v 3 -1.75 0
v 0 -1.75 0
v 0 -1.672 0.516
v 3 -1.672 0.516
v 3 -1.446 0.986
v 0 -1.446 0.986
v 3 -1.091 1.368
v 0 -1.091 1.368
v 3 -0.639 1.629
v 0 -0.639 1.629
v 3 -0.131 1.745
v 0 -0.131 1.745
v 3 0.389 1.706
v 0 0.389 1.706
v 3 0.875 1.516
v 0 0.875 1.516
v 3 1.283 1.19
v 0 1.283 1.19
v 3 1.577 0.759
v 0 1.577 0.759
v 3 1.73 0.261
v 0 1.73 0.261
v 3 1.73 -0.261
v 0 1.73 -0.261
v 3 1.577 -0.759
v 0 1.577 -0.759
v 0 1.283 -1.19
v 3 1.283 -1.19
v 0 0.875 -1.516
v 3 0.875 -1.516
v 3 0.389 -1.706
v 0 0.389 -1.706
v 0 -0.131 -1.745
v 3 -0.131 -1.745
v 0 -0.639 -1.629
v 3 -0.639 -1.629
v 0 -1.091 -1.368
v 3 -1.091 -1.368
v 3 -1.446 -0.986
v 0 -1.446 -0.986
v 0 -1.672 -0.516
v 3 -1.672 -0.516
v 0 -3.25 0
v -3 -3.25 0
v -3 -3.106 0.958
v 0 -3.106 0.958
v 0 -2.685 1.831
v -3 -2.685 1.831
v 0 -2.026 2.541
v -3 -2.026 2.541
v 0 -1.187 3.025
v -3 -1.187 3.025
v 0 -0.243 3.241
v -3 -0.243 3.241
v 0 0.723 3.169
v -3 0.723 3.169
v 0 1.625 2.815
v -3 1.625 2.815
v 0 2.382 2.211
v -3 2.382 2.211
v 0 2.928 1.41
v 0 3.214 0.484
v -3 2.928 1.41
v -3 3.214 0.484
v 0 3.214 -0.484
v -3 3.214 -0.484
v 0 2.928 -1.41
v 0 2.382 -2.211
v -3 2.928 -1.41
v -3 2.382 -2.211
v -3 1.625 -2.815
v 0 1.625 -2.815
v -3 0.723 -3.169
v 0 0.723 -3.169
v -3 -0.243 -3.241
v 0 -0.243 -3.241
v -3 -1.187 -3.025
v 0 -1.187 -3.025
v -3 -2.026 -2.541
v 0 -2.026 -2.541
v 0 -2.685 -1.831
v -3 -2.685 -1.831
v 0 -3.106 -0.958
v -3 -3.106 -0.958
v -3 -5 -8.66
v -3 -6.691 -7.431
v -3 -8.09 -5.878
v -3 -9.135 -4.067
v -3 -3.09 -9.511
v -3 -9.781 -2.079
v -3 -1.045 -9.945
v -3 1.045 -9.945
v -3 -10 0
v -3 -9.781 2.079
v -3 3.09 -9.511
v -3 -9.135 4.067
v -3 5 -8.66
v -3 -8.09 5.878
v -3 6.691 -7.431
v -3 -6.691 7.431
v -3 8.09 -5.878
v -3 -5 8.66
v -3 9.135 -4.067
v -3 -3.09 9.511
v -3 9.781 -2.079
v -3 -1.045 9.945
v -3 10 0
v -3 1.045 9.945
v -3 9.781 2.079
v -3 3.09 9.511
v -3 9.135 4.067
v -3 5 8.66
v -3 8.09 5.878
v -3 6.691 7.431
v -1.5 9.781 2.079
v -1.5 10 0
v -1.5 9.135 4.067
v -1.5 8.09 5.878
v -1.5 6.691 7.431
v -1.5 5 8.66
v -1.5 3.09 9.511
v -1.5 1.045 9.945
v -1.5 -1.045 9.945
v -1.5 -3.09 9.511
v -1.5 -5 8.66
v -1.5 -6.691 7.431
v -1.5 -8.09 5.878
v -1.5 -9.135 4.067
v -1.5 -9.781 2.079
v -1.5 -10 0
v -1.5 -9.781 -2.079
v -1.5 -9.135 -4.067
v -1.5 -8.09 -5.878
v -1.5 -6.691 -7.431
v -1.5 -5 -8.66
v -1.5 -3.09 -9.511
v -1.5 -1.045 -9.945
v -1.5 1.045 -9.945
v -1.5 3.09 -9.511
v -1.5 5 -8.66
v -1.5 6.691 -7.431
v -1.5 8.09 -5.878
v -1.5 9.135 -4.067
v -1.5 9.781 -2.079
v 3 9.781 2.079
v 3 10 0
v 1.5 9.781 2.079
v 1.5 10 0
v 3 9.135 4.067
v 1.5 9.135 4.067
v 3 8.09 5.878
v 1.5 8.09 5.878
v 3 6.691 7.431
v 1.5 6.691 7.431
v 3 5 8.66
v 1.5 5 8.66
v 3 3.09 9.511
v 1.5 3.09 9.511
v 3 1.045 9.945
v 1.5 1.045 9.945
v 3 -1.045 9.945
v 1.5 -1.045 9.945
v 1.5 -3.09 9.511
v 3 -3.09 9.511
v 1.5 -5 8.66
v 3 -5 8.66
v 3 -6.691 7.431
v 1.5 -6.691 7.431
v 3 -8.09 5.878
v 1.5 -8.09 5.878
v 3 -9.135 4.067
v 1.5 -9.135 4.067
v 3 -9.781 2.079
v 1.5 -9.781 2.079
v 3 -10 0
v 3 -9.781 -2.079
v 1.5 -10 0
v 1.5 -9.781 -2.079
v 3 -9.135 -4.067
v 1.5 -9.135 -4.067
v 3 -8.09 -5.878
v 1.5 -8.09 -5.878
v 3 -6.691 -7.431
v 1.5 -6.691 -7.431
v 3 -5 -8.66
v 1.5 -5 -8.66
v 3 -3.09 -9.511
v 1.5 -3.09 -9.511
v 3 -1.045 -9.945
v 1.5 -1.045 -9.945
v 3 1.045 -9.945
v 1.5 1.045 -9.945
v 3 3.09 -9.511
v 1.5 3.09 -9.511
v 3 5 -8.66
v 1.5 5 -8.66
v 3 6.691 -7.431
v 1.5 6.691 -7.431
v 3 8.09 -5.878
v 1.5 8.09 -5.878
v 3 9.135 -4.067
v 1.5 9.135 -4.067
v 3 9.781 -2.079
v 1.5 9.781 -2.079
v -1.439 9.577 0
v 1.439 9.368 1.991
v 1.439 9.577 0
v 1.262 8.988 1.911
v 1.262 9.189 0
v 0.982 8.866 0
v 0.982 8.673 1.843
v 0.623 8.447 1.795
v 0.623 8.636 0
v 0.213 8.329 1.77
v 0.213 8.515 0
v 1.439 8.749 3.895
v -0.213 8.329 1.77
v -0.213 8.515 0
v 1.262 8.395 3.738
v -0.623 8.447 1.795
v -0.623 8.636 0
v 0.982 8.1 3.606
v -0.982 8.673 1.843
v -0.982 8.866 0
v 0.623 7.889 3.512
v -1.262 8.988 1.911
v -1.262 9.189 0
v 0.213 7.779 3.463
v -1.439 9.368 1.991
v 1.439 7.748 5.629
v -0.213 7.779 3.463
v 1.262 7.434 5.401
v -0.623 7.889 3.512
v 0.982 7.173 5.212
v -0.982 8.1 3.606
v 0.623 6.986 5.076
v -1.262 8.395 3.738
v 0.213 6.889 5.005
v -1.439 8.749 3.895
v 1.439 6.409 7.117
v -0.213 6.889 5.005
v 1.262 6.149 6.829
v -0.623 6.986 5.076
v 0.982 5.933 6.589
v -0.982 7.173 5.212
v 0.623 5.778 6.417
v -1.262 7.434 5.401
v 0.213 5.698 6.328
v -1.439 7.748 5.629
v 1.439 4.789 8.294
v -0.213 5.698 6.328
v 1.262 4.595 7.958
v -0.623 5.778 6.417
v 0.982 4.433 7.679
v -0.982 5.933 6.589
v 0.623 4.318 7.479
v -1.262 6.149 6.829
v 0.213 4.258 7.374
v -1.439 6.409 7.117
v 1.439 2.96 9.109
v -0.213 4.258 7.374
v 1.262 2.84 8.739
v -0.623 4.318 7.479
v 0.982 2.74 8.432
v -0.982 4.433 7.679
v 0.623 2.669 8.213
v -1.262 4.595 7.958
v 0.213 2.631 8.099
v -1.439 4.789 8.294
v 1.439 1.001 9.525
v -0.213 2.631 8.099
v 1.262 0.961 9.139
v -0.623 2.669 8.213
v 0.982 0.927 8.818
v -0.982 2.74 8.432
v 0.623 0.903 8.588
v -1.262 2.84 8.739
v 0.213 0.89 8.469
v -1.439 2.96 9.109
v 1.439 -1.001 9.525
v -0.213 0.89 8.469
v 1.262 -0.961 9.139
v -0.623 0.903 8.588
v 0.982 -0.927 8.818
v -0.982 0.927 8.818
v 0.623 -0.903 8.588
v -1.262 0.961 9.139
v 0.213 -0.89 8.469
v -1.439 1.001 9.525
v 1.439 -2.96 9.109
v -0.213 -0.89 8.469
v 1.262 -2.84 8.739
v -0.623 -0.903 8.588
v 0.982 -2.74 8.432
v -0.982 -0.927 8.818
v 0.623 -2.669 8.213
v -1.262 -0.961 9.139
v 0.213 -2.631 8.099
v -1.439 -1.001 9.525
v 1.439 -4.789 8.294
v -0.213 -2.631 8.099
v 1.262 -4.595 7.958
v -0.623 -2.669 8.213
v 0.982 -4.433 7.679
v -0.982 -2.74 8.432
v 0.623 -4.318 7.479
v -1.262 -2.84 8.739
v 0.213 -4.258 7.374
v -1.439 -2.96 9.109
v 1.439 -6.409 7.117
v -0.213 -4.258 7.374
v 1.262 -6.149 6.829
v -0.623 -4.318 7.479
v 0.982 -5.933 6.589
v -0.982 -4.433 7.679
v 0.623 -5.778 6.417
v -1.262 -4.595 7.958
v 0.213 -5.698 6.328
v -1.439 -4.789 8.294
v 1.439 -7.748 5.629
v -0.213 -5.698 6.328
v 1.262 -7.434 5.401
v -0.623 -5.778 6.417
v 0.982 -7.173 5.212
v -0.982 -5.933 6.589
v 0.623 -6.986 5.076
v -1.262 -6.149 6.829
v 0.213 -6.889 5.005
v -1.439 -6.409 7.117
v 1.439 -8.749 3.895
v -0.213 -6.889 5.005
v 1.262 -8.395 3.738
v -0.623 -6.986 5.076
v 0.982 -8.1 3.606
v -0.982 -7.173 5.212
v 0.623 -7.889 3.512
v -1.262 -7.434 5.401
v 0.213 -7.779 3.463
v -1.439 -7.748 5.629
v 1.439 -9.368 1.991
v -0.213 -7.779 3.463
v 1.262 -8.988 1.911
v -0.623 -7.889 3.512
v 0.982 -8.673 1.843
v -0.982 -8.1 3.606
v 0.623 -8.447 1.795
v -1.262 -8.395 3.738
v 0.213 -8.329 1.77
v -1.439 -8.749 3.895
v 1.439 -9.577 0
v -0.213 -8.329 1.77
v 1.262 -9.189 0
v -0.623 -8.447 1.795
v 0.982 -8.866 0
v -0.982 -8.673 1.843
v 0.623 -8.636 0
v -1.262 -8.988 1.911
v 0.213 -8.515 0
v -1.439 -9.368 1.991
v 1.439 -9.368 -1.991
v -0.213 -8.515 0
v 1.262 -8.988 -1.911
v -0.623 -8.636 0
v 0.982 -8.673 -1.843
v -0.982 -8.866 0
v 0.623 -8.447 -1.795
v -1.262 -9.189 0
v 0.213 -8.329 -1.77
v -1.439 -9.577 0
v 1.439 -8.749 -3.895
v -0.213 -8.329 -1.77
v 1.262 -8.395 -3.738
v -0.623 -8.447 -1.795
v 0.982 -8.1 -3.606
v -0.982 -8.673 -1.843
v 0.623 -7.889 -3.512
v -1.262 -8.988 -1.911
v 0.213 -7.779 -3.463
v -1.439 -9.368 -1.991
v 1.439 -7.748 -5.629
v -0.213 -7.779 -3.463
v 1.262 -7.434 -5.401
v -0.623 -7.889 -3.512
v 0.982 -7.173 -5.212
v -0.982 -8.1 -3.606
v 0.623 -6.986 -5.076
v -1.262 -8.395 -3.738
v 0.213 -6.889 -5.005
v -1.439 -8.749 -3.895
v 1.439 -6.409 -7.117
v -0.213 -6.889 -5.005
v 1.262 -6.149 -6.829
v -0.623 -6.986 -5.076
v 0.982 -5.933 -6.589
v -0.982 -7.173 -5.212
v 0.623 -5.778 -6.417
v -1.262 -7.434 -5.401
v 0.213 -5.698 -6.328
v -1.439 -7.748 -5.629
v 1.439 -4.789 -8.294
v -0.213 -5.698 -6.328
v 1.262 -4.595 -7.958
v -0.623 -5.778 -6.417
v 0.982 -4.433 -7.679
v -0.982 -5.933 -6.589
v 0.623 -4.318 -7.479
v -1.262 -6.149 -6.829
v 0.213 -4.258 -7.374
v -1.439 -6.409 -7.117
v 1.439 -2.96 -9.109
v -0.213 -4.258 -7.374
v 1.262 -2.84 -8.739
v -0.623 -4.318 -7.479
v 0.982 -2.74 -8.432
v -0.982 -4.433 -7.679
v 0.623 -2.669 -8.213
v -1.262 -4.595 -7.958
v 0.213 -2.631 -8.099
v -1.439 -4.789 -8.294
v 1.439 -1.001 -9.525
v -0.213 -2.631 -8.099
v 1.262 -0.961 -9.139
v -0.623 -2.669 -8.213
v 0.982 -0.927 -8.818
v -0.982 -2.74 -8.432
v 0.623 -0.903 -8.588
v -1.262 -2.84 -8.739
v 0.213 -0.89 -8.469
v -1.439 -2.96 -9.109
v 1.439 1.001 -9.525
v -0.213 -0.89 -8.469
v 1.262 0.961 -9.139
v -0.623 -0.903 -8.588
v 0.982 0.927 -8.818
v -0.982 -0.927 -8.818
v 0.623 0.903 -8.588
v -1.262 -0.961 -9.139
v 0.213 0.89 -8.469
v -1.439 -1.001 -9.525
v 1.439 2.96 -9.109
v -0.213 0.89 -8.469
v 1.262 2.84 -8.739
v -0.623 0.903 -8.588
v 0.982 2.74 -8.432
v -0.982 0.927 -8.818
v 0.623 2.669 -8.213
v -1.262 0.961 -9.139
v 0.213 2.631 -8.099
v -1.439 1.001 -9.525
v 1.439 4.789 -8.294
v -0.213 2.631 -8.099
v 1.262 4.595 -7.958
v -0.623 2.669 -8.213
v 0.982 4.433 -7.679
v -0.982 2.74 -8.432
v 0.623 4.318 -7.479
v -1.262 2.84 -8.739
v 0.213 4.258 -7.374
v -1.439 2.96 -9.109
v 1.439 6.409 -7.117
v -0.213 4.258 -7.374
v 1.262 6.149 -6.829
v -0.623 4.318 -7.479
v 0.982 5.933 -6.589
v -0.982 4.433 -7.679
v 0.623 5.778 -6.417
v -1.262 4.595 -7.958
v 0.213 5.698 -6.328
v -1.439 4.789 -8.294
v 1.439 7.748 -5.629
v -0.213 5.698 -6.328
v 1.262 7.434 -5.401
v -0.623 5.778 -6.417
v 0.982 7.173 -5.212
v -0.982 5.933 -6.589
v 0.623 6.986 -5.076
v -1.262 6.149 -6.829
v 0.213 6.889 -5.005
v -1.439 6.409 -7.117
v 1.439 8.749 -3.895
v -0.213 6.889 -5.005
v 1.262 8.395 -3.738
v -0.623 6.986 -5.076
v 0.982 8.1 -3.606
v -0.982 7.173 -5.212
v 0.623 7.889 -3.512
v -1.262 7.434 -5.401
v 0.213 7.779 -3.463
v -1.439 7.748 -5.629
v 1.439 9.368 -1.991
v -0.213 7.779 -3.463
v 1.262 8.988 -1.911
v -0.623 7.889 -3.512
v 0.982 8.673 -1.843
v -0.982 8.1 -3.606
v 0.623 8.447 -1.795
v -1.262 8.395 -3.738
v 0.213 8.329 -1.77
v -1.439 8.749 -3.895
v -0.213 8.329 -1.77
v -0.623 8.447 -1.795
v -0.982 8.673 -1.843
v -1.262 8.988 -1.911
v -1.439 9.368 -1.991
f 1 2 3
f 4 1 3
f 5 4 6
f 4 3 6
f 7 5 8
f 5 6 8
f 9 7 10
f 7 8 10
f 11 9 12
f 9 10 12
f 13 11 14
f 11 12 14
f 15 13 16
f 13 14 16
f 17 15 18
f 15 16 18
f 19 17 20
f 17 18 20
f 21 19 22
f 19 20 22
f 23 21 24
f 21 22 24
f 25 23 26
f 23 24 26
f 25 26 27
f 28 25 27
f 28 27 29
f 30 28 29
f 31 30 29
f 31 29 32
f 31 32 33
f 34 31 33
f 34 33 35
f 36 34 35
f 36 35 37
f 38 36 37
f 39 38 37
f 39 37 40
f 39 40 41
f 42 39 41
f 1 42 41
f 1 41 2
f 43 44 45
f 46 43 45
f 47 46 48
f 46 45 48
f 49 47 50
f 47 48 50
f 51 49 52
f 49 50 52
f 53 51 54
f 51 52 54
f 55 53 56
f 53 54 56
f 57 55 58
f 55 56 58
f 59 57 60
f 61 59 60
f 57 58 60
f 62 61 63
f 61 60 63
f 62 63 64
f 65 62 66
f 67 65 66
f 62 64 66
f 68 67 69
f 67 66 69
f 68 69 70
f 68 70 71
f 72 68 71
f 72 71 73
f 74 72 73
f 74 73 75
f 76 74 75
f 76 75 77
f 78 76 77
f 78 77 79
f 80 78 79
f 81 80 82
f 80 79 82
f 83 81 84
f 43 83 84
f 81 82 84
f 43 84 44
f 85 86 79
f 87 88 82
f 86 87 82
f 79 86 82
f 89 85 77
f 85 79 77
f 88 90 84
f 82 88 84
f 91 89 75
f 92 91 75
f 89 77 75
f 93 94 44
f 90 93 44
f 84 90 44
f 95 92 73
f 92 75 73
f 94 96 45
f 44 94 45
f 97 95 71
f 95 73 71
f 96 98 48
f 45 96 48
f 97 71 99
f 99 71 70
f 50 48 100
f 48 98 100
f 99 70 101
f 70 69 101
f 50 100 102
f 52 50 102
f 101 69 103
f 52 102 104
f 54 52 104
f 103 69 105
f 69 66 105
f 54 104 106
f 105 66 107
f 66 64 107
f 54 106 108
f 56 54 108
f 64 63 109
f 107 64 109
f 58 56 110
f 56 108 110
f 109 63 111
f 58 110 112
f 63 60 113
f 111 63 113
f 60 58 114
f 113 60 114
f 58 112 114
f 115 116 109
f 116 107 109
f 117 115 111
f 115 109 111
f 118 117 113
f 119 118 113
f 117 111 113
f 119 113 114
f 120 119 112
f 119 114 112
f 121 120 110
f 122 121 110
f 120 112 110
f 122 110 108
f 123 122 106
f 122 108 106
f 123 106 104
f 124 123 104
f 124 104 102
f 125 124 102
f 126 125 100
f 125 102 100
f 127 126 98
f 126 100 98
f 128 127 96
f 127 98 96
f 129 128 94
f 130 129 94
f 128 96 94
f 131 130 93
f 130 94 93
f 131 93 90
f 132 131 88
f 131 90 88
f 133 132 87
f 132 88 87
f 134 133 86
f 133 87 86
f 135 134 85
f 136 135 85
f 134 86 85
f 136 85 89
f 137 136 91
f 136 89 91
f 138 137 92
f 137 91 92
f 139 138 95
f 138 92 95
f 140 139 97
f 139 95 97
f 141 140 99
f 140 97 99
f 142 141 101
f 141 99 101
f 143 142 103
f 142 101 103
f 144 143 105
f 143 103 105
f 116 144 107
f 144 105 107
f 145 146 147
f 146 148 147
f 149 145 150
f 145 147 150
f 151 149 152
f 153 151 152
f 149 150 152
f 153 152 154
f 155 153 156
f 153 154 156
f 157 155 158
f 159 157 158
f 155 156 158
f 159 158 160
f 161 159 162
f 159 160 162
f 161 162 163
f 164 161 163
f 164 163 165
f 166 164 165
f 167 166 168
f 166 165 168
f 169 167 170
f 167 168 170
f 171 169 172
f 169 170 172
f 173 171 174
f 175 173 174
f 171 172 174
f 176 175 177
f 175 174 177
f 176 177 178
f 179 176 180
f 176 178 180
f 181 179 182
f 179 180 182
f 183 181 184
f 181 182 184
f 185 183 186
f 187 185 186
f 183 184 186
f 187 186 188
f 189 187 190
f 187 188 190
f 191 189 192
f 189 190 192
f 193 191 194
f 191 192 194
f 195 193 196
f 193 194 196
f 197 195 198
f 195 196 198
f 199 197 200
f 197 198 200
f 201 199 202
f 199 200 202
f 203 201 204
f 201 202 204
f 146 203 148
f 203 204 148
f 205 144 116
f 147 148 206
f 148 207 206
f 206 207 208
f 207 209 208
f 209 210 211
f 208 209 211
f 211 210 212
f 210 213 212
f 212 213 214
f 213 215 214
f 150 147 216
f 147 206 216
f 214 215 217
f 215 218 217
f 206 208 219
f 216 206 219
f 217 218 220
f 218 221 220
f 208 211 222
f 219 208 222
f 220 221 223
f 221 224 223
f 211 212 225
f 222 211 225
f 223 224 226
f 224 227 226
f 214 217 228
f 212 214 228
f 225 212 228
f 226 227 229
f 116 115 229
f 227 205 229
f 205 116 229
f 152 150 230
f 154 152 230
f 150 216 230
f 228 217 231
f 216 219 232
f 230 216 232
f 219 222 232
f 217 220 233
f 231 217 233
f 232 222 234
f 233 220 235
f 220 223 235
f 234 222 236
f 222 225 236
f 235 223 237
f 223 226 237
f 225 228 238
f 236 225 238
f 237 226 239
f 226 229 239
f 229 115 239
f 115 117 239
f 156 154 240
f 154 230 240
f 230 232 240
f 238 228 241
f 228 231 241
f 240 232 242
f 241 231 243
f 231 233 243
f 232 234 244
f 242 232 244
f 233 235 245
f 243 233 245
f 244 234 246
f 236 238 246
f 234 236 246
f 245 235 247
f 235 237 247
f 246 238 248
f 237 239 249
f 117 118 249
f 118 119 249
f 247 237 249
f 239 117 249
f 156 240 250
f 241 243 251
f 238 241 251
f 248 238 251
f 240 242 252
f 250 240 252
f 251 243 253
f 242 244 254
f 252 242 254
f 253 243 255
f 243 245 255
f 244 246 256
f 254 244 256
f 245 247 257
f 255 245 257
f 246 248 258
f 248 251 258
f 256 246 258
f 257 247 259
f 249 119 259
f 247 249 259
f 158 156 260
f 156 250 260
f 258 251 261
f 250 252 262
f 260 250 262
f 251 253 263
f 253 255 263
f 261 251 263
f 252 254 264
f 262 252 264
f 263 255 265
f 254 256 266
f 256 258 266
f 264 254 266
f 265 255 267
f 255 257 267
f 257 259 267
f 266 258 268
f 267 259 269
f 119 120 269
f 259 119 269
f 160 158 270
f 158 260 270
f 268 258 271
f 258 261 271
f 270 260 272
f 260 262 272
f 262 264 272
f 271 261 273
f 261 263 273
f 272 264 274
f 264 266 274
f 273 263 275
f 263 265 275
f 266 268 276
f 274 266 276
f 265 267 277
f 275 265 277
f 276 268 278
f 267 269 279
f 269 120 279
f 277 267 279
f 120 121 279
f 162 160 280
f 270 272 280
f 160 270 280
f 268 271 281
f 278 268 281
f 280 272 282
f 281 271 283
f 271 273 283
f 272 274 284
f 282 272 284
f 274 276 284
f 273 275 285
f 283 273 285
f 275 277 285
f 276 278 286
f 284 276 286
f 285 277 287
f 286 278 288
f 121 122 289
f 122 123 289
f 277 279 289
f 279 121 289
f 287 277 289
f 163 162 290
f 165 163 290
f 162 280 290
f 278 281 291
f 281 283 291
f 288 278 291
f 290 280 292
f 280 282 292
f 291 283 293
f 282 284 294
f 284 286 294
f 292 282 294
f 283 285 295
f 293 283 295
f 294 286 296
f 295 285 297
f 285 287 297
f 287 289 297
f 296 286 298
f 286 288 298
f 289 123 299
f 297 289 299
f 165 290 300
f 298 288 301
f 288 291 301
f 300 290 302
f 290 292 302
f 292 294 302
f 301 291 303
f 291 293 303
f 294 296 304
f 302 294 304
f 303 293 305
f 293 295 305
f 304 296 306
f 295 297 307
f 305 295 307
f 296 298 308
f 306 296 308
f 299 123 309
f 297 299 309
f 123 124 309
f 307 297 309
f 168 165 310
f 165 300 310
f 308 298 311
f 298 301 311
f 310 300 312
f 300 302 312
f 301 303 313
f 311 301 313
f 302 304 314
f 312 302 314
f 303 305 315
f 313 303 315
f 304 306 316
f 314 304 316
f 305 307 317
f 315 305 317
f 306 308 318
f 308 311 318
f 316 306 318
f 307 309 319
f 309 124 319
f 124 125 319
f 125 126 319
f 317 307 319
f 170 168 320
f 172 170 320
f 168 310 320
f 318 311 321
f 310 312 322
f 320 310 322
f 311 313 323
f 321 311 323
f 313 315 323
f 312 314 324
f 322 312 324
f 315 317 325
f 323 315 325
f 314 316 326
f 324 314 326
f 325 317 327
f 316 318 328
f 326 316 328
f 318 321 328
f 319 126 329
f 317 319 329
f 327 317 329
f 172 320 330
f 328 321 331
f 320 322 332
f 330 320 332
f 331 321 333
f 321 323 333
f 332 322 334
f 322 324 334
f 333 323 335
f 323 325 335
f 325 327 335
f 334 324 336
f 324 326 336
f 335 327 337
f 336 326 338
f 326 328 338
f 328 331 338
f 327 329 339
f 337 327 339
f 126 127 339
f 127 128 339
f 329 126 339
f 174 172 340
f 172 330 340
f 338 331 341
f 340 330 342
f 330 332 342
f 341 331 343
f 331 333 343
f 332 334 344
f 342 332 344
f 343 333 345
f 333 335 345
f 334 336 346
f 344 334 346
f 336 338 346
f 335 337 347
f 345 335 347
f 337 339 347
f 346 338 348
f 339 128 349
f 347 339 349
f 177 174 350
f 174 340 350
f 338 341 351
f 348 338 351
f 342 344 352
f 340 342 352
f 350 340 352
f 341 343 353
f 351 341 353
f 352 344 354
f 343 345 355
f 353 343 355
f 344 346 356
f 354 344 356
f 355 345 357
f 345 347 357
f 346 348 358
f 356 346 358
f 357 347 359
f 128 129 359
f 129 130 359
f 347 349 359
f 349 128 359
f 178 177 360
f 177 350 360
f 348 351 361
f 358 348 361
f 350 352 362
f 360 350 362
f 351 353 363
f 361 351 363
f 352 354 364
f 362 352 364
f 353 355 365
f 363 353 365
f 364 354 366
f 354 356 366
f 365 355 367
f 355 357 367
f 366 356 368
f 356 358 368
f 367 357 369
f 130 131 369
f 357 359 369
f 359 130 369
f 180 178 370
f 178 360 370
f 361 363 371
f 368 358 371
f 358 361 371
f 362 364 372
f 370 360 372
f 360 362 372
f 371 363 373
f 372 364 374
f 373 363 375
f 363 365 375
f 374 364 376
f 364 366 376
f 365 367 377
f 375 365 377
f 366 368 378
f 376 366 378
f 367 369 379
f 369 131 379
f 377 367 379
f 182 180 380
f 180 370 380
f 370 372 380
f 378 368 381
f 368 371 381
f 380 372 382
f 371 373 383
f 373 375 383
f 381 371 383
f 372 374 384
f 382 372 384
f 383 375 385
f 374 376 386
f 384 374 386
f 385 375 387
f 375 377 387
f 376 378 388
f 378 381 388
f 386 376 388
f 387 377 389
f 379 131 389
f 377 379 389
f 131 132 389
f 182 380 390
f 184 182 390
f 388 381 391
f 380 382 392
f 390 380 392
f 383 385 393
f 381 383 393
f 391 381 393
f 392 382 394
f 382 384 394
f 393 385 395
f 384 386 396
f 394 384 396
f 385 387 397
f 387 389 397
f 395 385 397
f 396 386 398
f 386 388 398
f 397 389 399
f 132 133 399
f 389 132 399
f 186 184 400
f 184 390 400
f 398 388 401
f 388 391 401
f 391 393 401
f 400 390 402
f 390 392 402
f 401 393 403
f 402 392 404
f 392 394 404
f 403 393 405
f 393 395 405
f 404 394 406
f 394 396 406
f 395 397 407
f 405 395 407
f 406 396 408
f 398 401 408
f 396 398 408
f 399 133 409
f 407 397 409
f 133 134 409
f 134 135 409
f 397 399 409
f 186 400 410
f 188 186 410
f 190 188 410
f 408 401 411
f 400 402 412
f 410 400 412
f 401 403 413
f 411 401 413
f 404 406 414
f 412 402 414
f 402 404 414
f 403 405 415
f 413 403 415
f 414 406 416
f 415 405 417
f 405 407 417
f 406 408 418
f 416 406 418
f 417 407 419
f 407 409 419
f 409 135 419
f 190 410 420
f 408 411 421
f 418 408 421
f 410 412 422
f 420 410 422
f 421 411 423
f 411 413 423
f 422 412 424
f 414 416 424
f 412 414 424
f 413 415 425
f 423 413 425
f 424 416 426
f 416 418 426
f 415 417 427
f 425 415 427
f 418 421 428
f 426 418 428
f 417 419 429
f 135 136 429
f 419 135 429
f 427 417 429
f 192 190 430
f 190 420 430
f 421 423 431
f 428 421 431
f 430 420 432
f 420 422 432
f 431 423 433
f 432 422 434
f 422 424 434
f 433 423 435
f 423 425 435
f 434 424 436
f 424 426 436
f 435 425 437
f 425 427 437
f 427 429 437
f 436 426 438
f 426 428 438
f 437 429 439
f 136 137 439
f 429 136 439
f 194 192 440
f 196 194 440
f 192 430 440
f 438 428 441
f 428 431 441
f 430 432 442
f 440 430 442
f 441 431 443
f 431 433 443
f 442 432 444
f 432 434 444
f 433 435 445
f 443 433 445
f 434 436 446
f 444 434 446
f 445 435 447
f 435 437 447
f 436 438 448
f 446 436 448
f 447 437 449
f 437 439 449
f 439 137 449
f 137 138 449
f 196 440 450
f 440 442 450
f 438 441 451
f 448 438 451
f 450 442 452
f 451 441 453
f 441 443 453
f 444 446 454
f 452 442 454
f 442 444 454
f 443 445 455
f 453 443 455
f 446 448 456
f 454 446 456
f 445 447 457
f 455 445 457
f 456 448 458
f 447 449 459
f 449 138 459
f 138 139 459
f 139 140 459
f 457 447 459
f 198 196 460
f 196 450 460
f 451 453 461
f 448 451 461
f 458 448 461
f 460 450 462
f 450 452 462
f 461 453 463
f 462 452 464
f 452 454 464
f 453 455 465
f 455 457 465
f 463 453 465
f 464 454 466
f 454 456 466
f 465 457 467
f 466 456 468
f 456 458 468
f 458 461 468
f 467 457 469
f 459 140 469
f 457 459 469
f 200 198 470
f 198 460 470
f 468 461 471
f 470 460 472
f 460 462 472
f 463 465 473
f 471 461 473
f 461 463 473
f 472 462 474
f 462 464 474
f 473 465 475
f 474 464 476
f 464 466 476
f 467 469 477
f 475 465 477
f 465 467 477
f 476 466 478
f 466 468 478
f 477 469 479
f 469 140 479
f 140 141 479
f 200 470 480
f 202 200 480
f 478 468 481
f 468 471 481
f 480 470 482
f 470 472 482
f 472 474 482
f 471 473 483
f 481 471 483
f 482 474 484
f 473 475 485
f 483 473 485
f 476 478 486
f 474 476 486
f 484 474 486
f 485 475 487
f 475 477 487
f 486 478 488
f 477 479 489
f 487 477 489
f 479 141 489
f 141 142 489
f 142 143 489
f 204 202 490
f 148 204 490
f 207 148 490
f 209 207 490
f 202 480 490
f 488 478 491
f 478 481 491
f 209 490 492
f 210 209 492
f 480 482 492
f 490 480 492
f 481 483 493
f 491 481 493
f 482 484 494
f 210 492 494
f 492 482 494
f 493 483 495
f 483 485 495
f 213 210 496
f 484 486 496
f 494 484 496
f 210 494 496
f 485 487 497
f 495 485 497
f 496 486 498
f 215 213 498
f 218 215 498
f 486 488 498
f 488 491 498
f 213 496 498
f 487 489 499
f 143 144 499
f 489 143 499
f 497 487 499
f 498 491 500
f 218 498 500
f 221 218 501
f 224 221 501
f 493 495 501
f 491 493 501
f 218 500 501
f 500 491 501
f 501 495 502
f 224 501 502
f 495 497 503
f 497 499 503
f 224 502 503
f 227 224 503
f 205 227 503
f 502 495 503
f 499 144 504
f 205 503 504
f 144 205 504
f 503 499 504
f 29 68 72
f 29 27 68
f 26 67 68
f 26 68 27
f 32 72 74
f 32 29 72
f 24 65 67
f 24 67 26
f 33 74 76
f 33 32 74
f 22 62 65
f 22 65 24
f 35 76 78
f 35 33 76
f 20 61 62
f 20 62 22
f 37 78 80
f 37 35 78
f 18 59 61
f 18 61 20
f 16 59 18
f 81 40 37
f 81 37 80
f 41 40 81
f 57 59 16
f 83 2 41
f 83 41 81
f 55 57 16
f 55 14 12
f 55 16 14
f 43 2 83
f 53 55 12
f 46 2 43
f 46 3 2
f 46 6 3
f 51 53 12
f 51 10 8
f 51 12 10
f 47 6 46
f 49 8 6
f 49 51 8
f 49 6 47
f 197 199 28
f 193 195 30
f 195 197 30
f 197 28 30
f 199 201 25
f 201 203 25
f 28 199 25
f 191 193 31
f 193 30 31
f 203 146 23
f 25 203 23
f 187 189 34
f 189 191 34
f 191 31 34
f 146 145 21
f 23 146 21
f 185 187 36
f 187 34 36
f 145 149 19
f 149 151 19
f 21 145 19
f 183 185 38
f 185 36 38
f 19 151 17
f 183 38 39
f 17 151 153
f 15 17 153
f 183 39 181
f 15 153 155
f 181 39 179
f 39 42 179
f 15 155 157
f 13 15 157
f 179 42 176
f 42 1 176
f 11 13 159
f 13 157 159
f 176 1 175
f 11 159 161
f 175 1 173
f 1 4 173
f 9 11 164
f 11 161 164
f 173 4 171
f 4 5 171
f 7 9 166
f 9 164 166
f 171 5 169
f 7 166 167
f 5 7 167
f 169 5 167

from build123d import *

# Parameters (mm, degrees)
F3_R     = 1.75
F4_DEPTH = 6
F5_R     = 3.25
F6_DEPTH = 3


with BuildPart() as f1:
    # F0 (on Top) → F1 (revolve)
    with BuildSketch(Plane.XY):
        with BuildLine():
            Line((-3, 0), (3, 0))
            Line((3, 0), (3, 10))
            Line((3, 10), (1.5, 10))
            ThreePointArc((1.5, 10), (0, 8.5), (-1.5, 10))
            Line((-1.5, 10), (-3, 10))
            Line((-3, 10), (-3, 0))
        make_face()
    revolve(axis=Axis((0, 0, 0), (1, 0, 0)))

    # F3 (on offset) → F4 (cut, through all)
    with BuildSketch(Plane(origin=(-3, 0, 0), x_dir=(0, -1, 0), z_dir=(-1, 0, 0))):
        Circle(F3_R)
    extrude(amount=-F4_DEPTH, mode=Mode.SUBTRACT)

    # F5 (on offset) → F6 (cut)
    with BuildSketch(Plane(origin=(-3, 0, 0), x_dir=(0, -1, 0), z_dir=(-1, 0, 0))):
        Circle(F5_R)
    extrude(amount=-F6_DEPTH, mode=Mode.SUBTRACT)


solid = f1.part
